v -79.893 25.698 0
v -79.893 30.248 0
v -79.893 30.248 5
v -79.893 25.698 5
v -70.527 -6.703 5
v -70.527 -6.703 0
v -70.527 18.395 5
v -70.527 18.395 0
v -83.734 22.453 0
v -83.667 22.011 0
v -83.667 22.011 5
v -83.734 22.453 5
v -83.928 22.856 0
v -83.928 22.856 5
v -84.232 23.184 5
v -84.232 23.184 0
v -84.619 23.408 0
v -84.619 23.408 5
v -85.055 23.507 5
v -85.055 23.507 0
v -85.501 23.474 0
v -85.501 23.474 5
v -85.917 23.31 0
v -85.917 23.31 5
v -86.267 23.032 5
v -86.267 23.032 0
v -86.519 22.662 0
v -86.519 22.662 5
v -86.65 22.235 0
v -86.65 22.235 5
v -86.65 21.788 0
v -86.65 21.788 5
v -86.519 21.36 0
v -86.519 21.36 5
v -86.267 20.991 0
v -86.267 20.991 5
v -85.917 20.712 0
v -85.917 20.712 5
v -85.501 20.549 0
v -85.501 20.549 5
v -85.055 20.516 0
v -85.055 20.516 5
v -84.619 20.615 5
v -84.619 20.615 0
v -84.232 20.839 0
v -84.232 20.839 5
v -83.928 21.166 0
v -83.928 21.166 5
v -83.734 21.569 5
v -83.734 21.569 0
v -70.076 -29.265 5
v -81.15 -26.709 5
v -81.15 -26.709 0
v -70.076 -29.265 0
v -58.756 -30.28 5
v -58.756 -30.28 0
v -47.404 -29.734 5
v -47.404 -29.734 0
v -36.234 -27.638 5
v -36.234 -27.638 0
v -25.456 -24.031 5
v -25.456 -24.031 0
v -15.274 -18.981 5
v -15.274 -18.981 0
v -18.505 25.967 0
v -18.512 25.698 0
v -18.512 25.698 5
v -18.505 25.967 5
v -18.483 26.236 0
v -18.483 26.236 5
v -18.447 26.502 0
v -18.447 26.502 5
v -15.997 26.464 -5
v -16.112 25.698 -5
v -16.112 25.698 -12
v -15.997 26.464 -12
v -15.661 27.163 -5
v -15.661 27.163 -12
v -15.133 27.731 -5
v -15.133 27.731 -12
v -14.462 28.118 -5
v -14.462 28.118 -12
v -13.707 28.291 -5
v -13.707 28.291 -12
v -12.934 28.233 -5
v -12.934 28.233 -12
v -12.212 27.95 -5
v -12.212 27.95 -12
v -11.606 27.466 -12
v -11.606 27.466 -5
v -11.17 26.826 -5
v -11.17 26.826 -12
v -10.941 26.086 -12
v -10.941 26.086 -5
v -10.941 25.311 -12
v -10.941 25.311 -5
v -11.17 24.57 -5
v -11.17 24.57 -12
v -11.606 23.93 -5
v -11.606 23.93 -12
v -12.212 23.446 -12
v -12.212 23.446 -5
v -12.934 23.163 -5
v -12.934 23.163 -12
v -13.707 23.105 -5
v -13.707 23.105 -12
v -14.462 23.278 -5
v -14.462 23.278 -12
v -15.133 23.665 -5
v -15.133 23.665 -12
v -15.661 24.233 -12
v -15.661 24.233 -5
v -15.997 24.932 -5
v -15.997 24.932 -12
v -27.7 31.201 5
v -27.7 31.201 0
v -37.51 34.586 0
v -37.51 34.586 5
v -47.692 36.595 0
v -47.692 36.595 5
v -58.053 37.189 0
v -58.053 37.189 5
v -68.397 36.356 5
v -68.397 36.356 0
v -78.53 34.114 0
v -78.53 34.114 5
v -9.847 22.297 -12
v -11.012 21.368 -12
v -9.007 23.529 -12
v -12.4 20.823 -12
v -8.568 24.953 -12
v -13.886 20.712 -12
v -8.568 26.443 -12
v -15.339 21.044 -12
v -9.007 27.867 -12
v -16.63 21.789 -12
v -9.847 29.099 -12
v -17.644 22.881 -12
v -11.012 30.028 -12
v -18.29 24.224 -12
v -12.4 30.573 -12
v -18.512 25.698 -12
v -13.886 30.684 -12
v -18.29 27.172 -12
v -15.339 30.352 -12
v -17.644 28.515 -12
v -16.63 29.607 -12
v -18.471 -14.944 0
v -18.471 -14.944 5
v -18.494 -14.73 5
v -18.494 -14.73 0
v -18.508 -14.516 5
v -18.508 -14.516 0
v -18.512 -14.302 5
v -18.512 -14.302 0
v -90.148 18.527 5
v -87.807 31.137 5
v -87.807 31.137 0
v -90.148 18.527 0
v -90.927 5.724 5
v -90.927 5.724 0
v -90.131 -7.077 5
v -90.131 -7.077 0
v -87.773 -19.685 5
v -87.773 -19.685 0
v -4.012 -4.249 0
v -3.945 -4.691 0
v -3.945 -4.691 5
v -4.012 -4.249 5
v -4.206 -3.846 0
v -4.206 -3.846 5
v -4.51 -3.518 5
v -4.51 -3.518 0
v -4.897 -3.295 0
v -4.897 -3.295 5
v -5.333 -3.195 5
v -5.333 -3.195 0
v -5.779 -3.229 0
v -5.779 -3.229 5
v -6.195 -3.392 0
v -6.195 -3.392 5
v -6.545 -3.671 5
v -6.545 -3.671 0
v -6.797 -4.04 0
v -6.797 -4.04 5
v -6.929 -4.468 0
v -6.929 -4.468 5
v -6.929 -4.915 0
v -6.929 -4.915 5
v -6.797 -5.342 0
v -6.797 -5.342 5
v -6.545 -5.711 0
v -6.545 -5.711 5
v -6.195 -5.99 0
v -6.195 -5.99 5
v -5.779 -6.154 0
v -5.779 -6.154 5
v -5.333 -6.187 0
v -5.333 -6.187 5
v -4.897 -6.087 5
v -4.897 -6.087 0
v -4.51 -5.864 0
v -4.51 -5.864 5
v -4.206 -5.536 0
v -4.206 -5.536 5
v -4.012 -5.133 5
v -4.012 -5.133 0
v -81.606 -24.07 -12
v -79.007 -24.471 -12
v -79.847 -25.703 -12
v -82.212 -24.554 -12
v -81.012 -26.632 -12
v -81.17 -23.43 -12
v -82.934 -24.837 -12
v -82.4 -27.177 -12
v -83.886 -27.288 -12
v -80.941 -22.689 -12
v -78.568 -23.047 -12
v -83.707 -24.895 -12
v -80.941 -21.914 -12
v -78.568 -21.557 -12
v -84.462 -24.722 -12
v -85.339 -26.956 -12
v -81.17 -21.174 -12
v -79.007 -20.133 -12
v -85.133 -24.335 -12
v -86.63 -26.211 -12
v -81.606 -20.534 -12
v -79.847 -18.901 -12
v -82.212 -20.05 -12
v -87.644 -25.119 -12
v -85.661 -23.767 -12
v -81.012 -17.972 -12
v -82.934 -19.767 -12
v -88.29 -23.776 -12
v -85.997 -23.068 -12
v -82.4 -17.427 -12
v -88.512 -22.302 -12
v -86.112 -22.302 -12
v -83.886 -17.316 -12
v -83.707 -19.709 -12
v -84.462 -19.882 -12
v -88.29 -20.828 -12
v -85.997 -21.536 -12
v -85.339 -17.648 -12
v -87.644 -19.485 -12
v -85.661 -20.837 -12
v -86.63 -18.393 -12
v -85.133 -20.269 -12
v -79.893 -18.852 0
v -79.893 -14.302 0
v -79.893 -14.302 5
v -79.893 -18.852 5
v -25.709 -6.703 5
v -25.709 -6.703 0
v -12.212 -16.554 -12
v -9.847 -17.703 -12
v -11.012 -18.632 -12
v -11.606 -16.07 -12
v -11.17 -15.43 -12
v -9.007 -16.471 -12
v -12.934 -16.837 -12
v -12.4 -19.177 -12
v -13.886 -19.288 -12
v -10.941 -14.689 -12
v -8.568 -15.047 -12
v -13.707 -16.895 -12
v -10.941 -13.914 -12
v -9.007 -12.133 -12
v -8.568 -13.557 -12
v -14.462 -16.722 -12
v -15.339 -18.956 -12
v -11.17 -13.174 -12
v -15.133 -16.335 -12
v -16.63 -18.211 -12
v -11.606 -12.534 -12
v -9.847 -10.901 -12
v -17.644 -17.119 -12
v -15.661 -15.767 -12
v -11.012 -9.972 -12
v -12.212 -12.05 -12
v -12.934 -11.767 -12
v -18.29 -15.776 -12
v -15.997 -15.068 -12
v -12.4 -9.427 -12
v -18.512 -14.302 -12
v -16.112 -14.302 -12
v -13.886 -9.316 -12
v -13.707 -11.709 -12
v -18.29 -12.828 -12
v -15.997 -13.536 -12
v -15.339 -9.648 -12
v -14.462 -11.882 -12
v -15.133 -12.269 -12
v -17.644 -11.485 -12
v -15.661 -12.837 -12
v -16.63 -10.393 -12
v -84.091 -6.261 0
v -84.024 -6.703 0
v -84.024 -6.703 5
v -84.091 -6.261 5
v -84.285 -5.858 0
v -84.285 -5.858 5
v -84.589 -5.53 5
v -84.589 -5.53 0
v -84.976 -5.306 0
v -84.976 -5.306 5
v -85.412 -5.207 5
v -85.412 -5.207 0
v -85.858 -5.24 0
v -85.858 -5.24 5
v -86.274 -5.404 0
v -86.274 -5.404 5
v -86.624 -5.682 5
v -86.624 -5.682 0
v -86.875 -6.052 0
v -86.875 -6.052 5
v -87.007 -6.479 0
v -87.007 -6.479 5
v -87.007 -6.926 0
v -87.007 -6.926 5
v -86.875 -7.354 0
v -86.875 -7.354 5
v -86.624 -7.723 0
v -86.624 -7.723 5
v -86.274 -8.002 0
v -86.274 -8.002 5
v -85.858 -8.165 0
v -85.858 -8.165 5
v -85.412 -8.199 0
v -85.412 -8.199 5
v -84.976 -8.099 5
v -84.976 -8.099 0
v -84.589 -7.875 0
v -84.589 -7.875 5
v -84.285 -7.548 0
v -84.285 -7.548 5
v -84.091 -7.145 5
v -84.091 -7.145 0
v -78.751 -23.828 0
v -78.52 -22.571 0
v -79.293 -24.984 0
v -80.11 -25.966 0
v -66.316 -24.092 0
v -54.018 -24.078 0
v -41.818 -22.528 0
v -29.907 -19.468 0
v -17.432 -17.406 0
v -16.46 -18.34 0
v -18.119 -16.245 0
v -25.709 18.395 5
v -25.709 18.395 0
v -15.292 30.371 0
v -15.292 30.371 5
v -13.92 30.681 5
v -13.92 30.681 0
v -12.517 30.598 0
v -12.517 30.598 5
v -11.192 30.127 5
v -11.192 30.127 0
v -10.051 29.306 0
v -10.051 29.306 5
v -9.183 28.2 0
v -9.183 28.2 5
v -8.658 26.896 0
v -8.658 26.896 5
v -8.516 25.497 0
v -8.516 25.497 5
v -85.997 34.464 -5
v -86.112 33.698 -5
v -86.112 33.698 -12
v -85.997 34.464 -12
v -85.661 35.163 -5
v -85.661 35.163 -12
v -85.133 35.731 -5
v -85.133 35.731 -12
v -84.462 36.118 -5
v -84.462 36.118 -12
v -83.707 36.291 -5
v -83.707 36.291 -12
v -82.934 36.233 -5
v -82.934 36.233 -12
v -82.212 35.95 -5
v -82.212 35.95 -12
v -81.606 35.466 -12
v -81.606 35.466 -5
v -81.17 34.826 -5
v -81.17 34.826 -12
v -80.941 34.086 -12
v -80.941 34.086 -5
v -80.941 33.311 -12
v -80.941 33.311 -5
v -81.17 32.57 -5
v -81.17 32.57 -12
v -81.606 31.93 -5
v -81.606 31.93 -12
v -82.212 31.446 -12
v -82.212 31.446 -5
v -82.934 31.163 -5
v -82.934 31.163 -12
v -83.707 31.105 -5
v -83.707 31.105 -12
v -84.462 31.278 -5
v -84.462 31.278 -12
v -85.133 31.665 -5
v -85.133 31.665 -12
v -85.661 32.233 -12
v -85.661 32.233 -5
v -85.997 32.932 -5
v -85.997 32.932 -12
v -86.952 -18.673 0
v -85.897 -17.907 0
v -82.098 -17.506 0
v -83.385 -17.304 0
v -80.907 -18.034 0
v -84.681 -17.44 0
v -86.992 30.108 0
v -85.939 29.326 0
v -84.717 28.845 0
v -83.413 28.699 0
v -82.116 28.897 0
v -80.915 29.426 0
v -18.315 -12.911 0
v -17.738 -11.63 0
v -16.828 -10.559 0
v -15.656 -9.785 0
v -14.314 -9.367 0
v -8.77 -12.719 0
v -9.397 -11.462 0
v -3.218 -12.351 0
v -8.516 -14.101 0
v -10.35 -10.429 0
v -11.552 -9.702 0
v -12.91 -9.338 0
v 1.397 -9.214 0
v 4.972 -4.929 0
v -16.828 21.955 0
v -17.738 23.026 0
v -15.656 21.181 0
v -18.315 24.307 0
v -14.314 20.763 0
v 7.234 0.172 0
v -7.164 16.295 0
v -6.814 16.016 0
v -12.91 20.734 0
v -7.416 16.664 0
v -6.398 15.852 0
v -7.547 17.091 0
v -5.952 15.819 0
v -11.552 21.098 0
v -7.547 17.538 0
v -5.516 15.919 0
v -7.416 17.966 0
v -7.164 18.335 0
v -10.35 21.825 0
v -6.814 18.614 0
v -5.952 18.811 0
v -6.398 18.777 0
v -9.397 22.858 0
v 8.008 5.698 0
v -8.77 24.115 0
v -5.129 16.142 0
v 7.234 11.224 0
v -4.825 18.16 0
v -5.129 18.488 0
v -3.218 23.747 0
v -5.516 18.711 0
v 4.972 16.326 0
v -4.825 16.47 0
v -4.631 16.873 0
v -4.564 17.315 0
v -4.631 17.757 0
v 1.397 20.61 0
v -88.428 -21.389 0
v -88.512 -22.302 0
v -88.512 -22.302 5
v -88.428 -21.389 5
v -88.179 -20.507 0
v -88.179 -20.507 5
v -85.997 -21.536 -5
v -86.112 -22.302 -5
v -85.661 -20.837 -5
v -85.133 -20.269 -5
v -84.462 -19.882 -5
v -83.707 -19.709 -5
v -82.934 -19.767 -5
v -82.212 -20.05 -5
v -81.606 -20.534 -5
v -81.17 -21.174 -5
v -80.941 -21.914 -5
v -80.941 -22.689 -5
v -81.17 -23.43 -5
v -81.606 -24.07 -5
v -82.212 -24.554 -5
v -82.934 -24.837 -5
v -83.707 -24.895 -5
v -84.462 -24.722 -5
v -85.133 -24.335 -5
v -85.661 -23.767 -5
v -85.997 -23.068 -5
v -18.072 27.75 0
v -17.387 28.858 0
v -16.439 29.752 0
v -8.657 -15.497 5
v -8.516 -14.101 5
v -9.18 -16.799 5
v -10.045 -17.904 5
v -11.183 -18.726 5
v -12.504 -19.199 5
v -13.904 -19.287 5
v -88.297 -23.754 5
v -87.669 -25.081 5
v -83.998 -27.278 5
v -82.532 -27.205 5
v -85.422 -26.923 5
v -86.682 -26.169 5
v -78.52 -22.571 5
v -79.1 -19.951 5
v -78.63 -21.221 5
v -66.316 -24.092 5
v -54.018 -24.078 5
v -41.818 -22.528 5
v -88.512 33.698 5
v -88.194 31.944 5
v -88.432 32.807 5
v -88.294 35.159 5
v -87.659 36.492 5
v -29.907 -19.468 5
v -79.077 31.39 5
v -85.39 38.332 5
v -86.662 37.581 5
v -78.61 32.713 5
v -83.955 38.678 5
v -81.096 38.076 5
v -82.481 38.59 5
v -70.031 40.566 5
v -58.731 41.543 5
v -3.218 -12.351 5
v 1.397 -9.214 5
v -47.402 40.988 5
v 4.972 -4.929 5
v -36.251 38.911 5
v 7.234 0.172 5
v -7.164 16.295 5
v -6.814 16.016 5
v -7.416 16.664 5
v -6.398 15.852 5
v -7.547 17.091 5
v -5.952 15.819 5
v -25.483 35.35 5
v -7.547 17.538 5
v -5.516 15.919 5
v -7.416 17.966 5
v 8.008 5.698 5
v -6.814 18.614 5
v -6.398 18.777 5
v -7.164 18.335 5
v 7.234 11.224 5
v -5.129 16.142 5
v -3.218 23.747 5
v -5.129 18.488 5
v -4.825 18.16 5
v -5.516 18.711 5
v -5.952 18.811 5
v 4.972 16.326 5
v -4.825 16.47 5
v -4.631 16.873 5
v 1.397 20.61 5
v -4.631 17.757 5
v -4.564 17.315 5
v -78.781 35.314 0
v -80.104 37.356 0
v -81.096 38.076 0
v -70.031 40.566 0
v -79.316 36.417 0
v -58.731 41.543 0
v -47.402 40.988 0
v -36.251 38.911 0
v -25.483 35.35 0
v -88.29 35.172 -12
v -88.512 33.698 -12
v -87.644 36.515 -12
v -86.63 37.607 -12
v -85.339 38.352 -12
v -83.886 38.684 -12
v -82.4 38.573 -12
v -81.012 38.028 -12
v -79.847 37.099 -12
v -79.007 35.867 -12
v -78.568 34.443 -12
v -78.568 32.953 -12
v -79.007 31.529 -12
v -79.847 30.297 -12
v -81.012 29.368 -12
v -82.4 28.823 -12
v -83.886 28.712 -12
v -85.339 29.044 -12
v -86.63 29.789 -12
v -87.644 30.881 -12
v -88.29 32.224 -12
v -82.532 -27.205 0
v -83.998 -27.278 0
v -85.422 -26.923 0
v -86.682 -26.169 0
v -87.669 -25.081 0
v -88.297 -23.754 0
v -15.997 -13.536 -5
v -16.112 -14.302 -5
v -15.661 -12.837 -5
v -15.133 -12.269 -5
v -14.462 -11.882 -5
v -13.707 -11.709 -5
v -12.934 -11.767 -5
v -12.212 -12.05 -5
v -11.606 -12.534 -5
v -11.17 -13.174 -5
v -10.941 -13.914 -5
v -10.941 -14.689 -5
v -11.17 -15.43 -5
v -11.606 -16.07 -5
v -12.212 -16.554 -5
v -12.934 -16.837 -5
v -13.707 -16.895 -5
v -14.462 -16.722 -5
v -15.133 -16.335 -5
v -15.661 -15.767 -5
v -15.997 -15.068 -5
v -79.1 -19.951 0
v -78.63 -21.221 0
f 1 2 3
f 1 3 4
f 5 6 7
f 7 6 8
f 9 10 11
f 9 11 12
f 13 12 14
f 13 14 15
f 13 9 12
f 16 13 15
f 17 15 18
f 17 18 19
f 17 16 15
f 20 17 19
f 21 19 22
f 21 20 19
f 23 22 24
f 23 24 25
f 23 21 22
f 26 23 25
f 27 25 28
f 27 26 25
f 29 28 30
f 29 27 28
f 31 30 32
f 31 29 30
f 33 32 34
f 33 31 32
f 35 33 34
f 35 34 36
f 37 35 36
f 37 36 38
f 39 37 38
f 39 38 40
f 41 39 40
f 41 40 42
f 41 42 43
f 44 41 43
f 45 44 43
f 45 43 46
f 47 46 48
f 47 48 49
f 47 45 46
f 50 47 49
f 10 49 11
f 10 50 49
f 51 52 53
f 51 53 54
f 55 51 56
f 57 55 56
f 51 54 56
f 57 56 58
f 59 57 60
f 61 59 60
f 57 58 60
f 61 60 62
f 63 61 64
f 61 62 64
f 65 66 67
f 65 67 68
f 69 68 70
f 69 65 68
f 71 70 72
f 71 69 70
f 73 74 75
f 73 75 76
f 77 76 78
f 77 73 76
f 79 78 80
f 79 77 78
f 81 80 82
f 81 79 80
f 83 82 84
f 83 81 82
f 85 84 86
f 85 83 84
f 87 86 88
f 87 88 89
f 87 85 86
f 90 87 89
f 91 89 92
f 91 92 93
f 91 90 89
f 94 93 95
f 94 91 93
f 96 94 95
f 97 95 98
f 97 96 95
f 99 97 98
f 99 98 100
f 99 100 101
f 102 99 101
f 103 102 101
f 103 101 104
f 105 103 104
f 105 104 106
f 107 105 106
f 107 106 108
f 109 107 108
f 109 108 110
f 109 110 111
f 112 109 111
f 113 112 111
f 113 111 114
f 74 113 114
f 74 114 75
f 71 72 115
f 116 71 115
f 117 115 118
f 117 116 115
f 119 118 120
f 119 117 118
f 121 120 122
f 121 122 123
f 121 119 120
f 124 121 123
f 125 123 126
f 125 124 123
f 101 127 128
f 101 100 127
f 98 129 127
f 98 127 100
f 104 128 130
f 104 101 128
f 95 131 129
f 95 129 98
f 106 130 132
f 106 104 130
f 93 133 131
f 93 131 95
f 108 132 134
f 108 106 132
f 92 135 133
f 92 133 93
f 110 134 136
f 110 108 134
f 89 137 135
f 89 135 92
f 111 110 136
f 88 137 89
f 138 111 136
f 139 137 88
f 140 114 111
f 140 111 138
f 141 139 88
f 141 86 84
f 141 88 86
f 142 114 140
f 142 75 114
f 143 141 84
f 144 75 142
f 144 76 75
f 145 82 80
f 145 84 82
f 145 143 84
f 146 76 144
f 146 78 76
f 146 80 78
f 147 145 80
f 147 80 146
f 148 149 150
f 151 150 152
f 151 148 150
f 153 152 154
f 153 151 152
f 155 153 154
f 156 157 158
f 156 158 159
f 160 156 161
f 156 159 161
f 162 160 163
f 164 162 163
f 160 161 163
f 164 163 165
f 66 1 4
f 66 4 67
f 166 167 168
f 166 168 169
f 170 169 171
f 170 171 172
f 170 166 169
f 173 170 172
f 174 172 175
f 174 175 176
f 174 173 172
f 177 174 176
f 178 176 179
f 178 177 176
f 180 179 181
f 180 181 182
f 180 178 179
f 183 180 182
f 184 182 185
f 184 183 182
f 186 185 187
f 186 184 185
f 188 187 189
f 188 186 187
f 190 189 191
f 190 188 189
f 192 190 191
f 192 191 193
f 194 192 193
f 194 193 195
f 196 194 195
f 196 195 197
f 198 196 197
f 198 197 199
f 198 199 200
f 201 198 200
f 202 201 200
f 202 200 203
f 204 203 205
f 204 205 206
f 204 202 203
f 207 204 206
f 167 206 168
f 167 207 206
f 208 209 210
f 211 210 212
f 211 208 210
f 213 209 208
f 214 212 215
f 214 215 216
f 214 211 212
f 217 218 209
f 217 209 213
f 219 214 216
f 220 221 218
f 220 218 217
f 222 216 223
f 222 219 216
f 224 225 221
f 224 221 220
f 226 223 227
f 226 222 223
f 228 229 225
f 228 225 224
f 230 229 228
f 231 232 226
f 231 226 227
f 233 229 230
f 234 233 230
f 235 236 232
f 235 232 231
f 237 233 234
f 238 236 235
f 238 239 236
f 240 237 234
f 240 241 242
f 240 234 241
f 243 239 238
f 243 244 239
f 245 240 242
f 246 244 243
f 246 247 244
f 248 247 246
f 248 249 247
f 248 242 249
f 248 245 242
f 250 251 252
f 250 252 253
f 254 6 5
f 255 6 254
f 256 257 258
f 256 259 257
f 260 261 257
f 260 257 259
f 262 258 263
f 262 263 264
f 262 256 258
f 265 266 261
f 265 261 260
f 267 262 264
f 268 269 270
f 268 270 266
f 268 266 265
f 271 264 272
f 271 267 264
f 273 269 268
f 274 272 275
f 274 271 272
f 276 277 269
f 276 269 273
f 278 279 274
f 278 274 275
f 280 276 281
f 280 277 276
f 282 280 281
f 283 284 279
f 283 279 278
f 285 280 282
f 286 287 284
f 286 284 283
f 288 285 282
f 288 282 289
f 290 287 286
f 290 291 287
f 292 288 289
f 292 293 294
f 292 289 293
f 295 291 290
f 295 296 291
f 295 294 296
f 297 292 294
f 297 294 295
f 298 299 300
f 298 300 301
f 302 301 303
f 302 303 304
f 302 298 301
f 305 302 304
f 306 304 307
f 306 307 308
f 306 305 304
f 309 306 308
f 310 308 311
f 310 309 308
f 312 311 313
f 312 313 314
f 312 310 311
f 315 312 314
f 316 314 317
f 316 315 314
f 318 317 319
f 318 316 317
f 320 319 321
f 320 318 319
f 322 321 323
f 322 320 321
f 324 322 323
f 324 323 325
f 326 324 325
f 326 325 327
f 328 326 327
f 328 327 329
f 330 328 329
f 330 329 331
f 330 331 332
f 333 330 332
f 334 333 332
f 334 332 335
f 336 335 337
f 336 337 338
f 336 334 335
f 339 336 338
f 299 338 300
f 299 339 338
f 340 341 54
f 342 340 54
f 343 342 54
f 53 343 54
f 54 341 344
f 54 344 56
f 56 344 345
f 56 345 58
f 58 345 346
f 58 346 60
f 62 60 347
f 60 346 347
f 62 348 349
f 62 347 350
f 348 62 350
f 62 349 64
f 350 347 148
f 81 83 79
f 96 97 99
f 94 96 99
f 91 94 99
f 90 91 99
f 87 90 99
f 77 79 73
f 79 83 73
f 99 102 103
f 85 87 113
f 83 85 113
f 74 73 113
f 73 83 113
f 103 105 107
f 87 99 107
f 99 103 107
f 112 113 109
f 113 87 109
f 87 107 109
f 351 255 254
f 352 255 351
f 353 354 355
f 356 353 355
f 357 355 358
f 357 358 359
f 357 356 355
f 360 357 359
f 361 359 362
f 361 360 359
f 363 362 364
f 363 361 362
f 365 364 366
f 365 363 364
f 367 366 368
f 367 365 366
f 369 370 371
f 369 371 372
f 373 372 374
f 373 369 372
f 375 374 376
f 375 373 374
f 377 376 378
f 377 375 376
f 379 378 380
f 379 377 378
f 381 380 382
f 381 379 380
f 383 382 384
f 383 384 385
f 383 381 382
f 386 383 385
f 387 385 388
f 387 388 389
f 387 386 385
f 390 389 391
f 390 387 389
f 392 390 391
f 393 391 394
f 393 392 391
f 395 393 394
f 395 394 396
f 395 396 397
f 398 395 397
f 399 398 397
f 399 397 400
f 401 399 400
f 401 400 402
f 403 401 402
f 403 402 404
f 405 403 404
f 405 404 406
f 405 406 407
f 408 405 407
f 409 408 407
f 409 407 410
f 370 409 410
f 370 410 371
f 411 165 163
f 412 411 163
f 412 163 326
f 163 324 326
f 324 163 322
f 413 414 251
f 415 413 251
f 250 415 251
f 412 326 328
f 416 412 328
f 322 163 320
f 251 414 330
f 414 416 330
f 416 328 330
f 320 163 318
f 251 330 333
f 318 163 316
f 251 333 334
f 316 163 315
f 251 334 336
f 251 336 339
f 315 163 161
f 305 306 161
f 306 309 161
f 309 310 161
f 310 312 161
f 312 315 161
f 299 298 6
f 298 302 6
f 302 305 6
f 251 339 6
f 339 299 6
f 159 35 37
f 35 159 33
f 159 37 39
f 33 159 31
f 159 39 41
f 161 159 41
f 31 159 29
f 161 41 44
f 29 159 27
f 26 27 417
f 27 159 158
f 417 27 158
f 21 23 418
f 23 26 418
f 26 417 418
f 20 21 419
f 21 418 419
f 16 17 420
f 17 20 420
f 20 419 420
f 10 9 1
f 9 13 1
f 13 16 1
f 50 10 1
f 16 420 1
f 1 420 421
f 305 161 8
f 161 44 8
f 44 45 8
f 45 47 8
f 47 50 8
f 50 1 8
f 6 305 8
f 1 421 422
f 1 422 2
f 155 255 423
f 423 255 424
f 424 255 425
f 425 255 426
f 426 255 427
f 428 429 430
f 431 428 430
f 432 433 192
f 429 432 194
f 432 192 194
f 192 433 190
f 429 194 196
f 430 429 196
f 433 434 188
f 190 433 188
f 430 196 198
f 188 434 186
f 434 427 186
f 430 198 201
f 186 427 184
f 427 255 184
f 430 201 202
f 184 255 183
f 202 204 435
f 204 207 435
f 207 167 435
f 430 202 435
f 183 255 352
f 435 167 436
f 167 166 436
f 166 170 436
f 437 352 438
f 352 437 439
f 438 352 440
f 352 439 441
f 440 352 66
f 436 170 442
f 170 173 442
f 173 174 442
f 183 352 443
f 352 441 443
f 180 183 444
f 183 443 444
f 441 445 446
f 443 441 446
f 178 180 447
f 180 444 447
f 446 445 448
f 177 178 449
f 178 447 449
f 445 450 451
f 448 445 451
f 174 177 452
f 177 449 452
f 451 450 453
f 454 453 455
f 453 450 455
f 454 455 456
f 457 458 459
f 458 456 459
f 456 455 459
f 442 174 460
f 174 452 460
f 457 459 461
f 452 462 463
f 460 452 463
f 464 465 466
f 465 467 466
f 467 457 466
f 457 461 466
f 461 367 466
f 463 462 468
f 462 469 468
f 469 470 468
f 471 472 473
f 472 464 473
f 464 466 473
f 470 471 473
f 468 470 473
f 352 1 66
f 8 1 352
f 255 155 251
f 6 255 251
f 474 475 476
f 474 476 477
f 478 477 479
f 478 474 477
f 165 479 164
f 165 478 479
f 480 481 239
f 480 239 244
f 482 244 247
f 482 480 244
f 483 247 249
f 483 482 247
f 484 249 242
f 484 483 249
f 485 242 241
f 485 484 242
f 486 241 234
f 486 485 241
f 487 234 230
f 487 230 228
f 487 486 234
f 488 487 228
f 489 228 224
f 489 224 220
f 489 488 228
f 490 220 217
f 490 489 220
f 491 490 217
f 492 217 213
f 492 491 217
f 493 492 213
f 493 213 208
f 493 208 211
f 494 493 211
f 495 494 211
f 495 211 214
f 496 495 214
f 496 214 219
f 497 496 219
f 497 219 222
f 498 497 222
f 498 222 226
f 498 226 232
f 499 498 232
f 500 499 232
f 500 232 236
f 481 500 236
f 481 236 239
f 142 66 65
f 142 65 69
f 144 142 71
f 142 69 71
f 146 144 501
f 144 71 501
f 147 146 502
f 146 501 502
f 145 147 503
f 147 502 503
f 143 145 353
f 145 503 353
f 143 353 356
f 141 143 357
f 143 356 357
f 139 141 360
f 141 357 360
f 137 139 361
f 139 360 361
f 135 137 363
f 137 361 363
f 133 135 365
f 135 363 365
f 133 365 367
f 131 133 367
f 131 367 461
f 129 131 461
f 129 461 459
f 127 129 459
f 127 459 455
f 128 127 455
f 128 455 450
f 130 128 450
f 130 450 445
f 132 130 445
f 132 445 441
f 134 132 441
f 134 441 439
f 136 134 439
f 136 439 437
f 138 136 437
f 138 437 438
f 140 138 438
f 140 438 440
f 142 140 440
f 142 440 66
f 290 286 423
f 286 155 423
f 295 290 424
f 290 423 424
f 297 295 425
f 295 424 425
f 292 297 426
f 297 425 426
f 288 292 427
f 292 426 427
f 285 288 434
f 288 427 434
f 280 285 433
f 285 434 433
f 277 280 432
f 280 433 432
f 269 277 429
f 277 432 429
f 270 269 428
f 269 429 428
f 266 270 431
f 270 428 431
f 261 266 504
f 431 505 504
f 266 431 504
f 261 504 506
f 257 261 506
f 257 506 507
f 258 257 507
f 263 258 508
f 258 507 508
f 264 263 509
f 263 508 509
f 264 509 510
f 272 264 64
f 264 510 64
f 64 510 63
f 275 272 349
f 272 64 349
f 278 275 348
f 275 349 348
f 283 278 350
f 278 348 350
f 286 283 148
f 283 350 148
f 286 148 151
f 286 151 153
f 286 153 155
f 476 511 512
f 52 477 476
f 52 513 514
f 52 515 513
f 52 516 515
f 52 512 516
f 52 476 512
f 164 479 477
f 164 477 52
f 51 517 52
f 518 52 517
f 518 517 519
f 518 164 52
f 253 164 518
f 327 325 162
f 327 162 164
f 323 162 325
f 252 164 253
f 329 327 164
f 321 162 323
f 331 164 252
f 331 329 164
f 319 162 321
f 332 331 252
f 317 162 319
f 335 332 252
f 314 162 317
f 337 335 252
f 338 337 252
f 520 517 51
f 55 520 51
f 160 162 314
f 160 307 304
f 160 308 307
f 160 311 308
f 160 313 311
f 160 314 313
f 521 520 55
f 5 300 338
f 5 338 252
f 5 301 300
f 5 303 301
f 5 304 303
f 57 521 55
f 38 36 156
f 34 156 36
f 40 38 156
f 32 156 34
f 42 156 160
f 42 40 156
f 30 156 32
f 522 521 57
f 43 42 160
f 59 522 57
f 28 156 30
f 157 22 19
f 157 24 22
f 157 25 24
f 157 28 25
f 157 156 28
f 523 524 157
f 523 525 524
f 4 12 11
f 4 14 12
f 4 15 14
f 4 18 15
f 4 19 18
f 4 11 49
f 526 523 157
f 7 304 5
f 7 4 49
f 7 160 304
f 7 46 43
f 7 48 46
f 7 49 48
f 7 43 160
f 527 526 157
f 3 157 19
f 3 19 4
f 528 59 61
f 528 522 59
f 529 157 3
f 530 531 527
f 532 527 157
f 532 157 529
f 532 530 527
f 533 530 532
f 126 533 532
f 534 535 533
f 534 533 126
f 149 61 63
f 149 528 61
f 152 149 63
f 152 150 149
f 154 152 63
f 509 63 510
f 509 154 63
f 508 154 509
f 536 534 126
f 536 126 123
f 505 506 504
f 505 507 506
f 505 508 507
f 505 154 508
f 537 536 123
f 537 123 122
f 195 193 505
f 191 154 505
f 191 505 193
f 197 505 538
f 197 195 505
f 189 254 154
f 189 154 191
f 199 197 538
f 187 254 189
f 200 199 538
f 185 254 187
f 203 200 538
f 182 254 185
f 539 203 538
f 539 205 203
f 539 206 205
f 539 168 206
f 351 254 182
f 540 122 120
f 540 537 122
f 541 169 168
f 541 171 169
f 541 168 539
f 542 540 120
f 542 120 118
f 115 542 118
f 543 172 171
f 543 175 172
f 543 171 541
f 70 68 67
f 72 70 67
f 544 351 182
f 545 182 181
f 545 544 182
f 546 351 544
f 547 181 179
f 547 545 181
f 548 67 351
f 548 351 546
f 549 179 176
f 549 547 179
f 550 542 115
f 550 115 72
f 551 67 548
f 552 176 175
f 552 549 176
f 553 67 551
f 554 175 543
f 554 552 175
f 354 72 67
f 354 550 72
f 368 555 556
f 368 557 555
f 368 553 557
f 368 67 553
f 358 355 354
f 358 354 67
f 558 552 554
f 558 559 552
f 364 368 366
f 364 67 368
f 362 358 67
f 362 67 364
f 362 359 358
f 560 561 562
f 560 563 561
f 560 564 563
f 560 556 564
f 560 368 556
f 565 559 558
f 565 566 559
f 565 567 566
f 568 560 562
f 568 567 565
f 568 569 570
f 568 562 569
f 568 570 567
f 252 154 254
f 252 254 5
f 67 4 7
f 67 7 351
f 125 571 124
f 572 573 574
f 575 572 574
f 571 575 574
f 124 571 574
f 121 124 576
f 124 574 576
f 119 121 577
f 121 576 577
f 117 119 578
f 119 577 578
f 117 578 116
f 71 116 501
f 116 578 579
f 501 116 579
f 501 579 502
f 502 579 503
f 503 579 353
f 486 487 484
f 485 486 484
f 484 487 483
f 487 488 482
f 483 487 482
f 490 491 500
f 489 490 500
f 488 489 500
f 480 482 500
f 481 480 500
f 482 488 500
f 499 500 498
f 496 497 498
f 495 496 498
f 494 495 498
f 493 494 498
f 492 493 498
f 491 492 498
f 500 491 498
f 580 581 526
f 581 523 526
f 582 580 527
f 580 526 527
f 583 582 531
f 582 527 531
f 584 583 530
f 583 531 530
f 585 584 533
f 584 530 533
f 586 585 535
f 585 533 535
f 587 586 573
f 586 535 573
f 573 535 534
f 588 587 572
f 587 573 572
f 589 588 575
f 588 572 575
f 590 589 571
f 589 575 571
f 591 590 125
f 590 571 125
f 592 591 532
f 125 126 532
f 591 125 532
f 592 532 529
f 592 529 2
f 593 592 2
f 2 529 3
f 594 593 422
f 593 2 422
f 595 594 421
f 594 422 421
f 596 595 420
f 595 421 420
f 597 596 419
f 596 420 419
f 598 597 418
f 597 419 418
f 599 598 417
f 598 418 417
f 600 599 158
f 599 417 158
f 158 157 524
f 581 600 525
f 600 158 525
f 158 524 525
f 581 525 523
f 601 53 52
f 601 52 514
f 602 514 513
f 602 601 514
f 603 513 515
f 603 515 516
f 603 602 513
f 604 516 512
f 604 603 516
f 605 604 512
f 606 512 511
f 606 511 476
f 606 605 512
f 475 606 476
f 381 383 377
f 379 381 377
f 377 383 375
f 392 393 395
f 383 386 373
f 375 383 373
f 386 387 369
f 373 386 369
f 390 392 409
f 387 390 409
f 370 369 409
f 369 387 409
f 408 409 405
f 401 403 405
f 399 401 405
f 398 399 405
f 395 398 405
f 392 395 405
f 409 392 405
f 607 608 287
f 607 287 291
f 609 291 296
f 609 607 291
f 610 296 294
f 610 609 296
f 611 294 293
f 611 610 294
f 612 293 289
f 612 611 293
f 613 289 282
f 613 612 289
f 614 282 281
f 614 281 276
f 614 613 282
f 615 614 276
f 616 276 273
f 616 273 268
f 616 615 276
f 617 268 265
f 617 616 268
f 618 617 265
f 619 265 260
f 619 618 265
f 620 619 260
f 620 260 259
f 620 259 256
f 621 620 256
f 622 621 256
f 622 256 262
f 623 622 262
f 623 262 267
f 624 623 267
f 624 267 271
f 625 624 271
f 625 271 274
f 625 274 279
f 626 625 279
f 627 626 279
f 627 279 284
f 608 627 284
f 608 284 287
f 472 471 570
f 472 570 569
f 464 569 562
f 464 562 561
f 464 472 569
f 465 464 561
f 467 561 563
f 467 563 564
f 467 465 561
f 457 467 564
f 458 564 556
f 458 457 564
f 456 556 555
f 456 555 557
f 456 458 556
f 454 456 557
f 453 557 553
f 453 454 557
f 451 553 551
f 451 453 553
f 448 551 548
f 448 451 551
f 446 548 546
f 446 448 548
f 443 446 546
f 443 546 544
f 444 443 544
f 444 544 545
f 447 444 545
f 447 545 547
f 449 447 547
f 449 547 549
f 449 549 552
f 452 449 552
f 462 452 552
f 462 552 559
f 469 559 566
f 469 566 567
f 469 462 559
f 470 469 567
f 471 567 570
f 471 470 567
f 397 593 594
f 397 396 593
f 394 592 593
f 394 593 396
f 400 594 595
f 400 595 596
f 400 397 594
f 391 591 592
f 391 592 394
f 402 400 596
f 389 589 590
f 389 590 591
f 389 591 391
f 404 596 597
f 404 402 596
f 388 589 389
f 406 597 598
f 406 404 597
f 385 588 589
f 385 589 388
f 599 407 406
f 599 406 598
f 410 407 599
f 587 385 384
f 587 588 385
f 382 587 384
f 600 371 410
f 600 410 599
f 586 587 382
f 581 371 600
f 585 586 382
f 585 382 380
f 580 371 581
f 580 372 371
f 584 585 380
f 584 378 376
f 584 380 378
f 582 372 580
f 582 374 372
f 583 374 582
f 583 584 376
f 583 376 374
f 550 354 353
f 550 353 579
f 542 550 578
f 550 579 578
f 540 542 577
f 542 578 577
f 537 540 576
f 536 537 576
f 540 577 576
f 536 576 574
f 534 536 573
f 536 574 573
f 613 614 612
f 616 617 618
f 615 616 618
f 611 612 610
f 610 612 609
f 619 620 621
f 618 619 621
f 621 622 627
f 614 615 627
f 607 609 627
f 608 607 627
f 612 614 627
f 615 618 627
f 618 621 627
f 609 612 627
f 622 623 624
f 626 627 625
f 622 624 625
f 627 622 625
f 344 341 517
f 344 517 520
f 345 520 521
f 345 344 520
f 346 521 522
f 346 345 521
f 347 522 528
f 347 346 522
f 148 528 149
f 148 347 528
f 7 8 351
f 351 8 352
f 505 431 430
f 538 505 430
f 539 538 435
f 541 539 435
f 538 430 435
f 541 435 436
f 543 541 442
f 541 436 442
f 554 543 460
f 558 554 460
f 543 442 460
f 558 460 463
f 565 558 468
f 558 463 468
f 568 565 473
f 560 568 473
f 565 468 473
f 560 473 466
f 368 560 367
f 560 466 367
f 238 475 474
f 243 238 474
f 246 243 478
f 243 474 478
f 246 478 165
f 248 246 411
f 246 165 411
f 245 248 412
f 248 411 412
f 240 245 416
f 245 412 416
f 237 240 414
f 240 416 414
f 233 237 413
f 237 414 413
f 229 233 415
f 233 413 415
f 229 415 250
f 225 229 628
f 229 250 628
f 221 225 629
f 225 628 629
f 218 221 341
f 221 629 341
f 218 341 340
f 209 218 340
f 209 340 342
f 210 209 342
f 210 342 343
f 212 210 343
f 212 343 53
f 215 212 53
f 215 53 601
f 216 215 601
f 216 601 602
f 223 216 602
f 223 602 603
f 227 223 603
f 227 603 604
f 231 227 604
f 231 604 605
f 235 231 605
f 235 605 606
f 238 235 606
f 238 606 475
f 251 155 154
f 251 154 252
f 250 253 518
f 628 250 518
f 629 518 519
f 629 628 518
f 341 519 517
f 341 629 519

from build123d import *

# Parameters (mm, degrees)
SKETCH1_R                       = 2.6
SKETCH1_R_2                     = 1.5
SKETCH1_W                       = 44.817241247
SKETCH1_H                       = 25.097655098
BOSS_EXTRUDE1_DEPTH             = 5
SKETCH2_R                       = 5
SKETCH2_R_2                     = 2.6
BOSS_EXTRUDE2_DEPTH             = 12
BOSS_EXTRUDE2_DIRECTION_2_REACH = 102.099
BOSS_EXTRUDE3_START             = -10
SKETCH3_R                       = 2.6
BOSS_EXTRUDE3_DEPTH             = 10


with BuildPart() as part:
    # Sketch1 → Boss-Extrude1 (new body)
    with BuildSketch(Plane.XY):
        with BuildLine():
            ThreePointArc((-87.127451531, -22.124820062), (-86.163911981, -24.765644938), (-83.600914186, -25.920377287))
            ThreePointArc((-83.600914186, -25.920377287), (-47.661538714, -29.763777863), (-13.512307499, -17.921462012))
            ThreePointArc((-13.512307499, -17.921462012), (-10.952947302, -16.861340184), (-9.892825615, -14.301979929))
            ThreePointArc((-9.892825615, -14.301979929), (8.007659225, 5.698020071), (-9.892825615, 25.698020071))
            ThreePointArc((-9.892825615, 25.698020071), (-10.952947373, 28.257380397), (-13.512307698, 29.317502154))
            ThreePointArc((-13.512307698, 29.317502154), (-47.63265011, 41.014505592), (-83.512307597, 37.317502154))
            ThreePointArc((-83.512307597, 37.317502154), (-86.071667988, 36.257380433), (-87.131789782, 33.698020071))
            ThreePointArc((-87.131789782, 33.698020071), (-90.927012387, 5.786304892), (-87.127451531, -22.124820062))
        make_face()
        with Locations((-83.512307698, -22.301979929)):
            Circle(SKETCH1_R, mode=Mode.SUBTRACT)
        with Locations((-83.512307698, 33.698020071)):
            Circle(SKETCH1_R, mode=Mode.SUBTRACT)
        with Locations((-13.512307698, 25.698020071)):
            Circle(SKETCH1_R, mode=Mode.SUBTRACT)
        with Locations((-13.512307698, -14.301979929)):
            Circle(SKETCH1_R, mode=Mode.SUBTRACT)
        with Locations((-85.16722268, 22.0113147)):
            Circle(SKETCH1_R_2, mode=Mode.SUBTRACT)
        with Locations((-85.523935714, -6.702744554)):
            Circle(SKETCH1_R_2, mode=Mode.SUBTRACT)
        with Locations((-6.064210345, 17.314888474)):
            Circle(SKETCH1_R_2, mode=Mode.SUBTRACT)
        with Locations((-5.445296778, -4.691116539)):
            Circle(SKETCH1_R_2, mode=Mode.SUBTRACT)
        with BuildLine():
            Line((-79.892825615, -14.301980328), (-79.892825615, -22.301979929))
            ThreePointArc((-79.892825615, -22.301979929), (-47.851158005, -23.48878534), (-17.131789782, -14.301980328))
            Line((-17.131789782, -14.301980328), (-79.892825615, -14.301980328))
        make_face(mode=Mode.SUBTRACT)
        with BuildLine():
            Line((-79.892825615, 33.698019868), (-79.892825615, 25.698020071))
            Line((-79.892825615, 25.698020071), (-17.131789782, 25.698020071))
            ThreePointArc((-17.131789782, 25.698020071), (-47.634119077, 36.587523584), (-79.892825615, 33.698019868))
        make_face(mode=Mode.SUBTRACT)
        with Locations((-48.117941597, 5.846082995)):
            Rectangle(SKETCH1_W, SKETCH1_H, mode=Mode.SUBTRACT)
    extrude(amount=BOSS_EXTRUDE1_DEPTH)

    # Sketch2 → Boss-Extrude2 (add)
    # profile 1 of 4: a face of its own
    with BuildSketch(Plane(origin=(0, 0, 0), x_dir=(-1, 0, 0), z_dir=(0, 0, -1))):
        with Locations((13.512307698, 25.698020071)):
            Circle(SKETCH2_R)
        with Locations((13.512307698, 25.698020071)):
            Circle(SKETCH2_R_2, mode=Mode.SUBTRACT)
    # profile 2 of 4: a face of its own
    with BuildSketch(Plane(origin=(0, 0, 0), x_dir=(-1, 0, 0), z_dir=(0, 0, -1))):
        with Locations((83.512307698, 33.698020071)):
            Circle(SKETCH2_R)
        with Locations((83.512307698, 33.698020071)):
            Circle(SKETCH2_R_2, mode=Mode.SUBTRACT)
    # profile 3 of 4: a face of its own
    with BuildSketch(Plane(origin=(0, 0, 0), x_dir=(-1, 0, 0), z_dir=(0, 0, -1))):
        with Locations((83.512307698, -22.301979929)):
            Circle(SKETCH2_R)
        with Locations((83.512307698, -22.301979929)):
            Circle(SKETCH2_R_2, mode=Mode.SUBTRACT)
    # profile 4 of 4: a face of its own
    with BuildSketch(Plane(origin=(0, 0, 0), x_dir=(-1, 0, 0), z_dir=(0, 0, -1))):
        with Locations((13.512307698, -14.301979929)):
            Circle(SKETCH2_R)
        with Locations((13.512307698, -14.301979929)):
            Circle(SKETCH2_R_2, mode=Mode.SUBTRACT)
    extrude(amount=BOSS_EXTRUDE2_DEPTH)

    # Boss-Extrude2 direction 2: up to this face of the body (flat: up to its plane)
    boss_extrude2_direction_2_end = Plane(part.part.faces().sort_by_distance((-86.07433416, -24.682416176, 5))[0])
    # Sketch2 → Boss-Extrude2 direction 2 (add, up to the picked face)
    with BuildSketch(Plane(origin=(0, 0, 0), x_dir=(-1, 0, 0), z_dir=(0, 0, -1)), mode=Mode.PRIVATE) as boss_extrude2_direction_2_sk1:
        with Locations((13.512307698, 25.698020071)):
            Circle(SKETCH2_R)
        with Locations((13.512307698, 25.698020071)):
            Circle(SKETCH2_R_2, mode=Mode.SUBTRACT)
    boss_extrude2_direction_2_tool1 = split(extrude(boss_extrude2_direction_2_sk1.sketch, amount=-BOSS_EXTRUDE2_DIRECTION_2_REACH, mode=Mode.PRIVATE), bisect_by=boss_extrude2_direction_2_end, keep=Keep.BOTH, mode=Mode.PRIVATE)
    # Sketch2 → Boss-Extrude2 direction 2 (add, up to the picked face)
    with BuildSketch(Plane(origin=(0, 0, 0), x_dir=(-1, 0, 0), z_dir=(0, 0, -1)), mode=Mode.PRIVATE) as boss_extrude2_direction_2_sk2:
        with Locations((83.512307698, 33.698020071)):
            Circle(SKETCH2_R)
        with Locations((83.512307698, 33.698020071)):
            Circle(SKETCH2_R_2, mode=Mode.SUBTRACT)
    boss_extrude2_direction_2_tool2 = split(extrude(boss_extrude2_direction_2_sk2.sketch, amount=-BOSS_EXTRUDE2_DIRECTION_2_REACH, mode=Mode.PRIVATE), bisect_by=boss_extrude2_direction_2_end, keep=Keep.BOTH, mode=Mode.PRIVATE)
    # Sketch2 → Boss-Extrude2 direction 2 (add, up to the picked face)
    with BuildSketch(Plane(origin=(0, 0, 0), x_dir=(-1, 0, 0), z_dir=(0, 0, -1)), mode=Mode.PRIVATE) as boss_extrude2_direction_2_sk3:
        with Locations((83.512307698, -22.301979929)):
            Circle(SKETCH2_R)
        with Locations((83.512307698, -22.301979929)):
            Circle(SKETCH2_R_2, mode=Mode.SUBTRACT)
    boss_extrude2_direction_2_tool3 = split(extrude(boss_extrude2_direction_2_sk3.sketch, amount=-BOSS_EXTRUDE2_DIRECTION_2_REACH, mode=Mode.PRIVATE), bisect_by=boss_extrude2_direction_2_end, keep=Keep.BOTH, mode=Mode.PRIVATE)
    # Sketch2 → Boss-Extrude2 direction 2 (add, up to the picked face)
    with BuildSketch(Plane(origin=(0, 0, 0), x_dir=(-1, 0, 0), z_dir=(0, 0, -1)), mode=Mode.PRIVATE) as boss_extrude2_direction_2_sk4:
        with Locations((13.512307698, -14.301979929)):
            Circle(SKETCH2_R)
        with Locations((13.512307698, -14.301979929)):
            Circle(SKETCH2_R_2, mode=Mode.SUBTRACT)
    boss_extrude2_direction_2_tool4 = split(extrude(boss_extrude2_direction_2_sk4.sketch, amount=-BOSS_EXTRUDE2_DIRECTION_2_REACH, mode=Mode.PRIVATE), bisect_by=boss_extrude2_direction_2_end, keep=Keep.BOTH, mode=Mode.PRIVATE)
    add(boss_extrude2_direction_2_tool1.solids().sort_by(Axis((-8.653729, 25.69802, 0), (0, 0, 1)))[0])
    add(boss_extrude2_direction_2_tool2.solids().sort_by(Axis((-78.653729, 33.69802, 0), (0, 0, 1)))[0])
    add(boss_extrude2_direction_2_tool3.solids().sort_by(Axis((-78.653729, -22.30198, 0), (0, 0, 1)))[0])
    add(boss_extrude2_direction_2_tool4.solids().sort_by(Axis((-8.653729, -14.30198, 0), (0, 0, 1)))[0])

    # Sketch3 → Boss-Extrude3 (add)
    with BuildSketch(Plane.XY.offset(5).offset(BOSS_EXTRUDE3_START)):
        with Locations(Location((-83.512307698, 33.698020071, 0), (0, 0, 180))):
            Circle(SKETCH3_R)
        with Locations(Location((-13.512307698, 25.698020071, 0), (0, 0, 180))):
            Circle(SKETCH3_R)
        with Locations(Location((-13.512307698, -14.301979929, 0), (0, 0, 180))):
            Circle(SKETCH3_R)
        with Locations(Location((-83.512307698, -22.301979929, 0), (0, 0, 180))):
            Circle(SKETCH3_R)
    extrude(amount=BOSS_EXTRUDE3_DEPTH)


solid = part.part
